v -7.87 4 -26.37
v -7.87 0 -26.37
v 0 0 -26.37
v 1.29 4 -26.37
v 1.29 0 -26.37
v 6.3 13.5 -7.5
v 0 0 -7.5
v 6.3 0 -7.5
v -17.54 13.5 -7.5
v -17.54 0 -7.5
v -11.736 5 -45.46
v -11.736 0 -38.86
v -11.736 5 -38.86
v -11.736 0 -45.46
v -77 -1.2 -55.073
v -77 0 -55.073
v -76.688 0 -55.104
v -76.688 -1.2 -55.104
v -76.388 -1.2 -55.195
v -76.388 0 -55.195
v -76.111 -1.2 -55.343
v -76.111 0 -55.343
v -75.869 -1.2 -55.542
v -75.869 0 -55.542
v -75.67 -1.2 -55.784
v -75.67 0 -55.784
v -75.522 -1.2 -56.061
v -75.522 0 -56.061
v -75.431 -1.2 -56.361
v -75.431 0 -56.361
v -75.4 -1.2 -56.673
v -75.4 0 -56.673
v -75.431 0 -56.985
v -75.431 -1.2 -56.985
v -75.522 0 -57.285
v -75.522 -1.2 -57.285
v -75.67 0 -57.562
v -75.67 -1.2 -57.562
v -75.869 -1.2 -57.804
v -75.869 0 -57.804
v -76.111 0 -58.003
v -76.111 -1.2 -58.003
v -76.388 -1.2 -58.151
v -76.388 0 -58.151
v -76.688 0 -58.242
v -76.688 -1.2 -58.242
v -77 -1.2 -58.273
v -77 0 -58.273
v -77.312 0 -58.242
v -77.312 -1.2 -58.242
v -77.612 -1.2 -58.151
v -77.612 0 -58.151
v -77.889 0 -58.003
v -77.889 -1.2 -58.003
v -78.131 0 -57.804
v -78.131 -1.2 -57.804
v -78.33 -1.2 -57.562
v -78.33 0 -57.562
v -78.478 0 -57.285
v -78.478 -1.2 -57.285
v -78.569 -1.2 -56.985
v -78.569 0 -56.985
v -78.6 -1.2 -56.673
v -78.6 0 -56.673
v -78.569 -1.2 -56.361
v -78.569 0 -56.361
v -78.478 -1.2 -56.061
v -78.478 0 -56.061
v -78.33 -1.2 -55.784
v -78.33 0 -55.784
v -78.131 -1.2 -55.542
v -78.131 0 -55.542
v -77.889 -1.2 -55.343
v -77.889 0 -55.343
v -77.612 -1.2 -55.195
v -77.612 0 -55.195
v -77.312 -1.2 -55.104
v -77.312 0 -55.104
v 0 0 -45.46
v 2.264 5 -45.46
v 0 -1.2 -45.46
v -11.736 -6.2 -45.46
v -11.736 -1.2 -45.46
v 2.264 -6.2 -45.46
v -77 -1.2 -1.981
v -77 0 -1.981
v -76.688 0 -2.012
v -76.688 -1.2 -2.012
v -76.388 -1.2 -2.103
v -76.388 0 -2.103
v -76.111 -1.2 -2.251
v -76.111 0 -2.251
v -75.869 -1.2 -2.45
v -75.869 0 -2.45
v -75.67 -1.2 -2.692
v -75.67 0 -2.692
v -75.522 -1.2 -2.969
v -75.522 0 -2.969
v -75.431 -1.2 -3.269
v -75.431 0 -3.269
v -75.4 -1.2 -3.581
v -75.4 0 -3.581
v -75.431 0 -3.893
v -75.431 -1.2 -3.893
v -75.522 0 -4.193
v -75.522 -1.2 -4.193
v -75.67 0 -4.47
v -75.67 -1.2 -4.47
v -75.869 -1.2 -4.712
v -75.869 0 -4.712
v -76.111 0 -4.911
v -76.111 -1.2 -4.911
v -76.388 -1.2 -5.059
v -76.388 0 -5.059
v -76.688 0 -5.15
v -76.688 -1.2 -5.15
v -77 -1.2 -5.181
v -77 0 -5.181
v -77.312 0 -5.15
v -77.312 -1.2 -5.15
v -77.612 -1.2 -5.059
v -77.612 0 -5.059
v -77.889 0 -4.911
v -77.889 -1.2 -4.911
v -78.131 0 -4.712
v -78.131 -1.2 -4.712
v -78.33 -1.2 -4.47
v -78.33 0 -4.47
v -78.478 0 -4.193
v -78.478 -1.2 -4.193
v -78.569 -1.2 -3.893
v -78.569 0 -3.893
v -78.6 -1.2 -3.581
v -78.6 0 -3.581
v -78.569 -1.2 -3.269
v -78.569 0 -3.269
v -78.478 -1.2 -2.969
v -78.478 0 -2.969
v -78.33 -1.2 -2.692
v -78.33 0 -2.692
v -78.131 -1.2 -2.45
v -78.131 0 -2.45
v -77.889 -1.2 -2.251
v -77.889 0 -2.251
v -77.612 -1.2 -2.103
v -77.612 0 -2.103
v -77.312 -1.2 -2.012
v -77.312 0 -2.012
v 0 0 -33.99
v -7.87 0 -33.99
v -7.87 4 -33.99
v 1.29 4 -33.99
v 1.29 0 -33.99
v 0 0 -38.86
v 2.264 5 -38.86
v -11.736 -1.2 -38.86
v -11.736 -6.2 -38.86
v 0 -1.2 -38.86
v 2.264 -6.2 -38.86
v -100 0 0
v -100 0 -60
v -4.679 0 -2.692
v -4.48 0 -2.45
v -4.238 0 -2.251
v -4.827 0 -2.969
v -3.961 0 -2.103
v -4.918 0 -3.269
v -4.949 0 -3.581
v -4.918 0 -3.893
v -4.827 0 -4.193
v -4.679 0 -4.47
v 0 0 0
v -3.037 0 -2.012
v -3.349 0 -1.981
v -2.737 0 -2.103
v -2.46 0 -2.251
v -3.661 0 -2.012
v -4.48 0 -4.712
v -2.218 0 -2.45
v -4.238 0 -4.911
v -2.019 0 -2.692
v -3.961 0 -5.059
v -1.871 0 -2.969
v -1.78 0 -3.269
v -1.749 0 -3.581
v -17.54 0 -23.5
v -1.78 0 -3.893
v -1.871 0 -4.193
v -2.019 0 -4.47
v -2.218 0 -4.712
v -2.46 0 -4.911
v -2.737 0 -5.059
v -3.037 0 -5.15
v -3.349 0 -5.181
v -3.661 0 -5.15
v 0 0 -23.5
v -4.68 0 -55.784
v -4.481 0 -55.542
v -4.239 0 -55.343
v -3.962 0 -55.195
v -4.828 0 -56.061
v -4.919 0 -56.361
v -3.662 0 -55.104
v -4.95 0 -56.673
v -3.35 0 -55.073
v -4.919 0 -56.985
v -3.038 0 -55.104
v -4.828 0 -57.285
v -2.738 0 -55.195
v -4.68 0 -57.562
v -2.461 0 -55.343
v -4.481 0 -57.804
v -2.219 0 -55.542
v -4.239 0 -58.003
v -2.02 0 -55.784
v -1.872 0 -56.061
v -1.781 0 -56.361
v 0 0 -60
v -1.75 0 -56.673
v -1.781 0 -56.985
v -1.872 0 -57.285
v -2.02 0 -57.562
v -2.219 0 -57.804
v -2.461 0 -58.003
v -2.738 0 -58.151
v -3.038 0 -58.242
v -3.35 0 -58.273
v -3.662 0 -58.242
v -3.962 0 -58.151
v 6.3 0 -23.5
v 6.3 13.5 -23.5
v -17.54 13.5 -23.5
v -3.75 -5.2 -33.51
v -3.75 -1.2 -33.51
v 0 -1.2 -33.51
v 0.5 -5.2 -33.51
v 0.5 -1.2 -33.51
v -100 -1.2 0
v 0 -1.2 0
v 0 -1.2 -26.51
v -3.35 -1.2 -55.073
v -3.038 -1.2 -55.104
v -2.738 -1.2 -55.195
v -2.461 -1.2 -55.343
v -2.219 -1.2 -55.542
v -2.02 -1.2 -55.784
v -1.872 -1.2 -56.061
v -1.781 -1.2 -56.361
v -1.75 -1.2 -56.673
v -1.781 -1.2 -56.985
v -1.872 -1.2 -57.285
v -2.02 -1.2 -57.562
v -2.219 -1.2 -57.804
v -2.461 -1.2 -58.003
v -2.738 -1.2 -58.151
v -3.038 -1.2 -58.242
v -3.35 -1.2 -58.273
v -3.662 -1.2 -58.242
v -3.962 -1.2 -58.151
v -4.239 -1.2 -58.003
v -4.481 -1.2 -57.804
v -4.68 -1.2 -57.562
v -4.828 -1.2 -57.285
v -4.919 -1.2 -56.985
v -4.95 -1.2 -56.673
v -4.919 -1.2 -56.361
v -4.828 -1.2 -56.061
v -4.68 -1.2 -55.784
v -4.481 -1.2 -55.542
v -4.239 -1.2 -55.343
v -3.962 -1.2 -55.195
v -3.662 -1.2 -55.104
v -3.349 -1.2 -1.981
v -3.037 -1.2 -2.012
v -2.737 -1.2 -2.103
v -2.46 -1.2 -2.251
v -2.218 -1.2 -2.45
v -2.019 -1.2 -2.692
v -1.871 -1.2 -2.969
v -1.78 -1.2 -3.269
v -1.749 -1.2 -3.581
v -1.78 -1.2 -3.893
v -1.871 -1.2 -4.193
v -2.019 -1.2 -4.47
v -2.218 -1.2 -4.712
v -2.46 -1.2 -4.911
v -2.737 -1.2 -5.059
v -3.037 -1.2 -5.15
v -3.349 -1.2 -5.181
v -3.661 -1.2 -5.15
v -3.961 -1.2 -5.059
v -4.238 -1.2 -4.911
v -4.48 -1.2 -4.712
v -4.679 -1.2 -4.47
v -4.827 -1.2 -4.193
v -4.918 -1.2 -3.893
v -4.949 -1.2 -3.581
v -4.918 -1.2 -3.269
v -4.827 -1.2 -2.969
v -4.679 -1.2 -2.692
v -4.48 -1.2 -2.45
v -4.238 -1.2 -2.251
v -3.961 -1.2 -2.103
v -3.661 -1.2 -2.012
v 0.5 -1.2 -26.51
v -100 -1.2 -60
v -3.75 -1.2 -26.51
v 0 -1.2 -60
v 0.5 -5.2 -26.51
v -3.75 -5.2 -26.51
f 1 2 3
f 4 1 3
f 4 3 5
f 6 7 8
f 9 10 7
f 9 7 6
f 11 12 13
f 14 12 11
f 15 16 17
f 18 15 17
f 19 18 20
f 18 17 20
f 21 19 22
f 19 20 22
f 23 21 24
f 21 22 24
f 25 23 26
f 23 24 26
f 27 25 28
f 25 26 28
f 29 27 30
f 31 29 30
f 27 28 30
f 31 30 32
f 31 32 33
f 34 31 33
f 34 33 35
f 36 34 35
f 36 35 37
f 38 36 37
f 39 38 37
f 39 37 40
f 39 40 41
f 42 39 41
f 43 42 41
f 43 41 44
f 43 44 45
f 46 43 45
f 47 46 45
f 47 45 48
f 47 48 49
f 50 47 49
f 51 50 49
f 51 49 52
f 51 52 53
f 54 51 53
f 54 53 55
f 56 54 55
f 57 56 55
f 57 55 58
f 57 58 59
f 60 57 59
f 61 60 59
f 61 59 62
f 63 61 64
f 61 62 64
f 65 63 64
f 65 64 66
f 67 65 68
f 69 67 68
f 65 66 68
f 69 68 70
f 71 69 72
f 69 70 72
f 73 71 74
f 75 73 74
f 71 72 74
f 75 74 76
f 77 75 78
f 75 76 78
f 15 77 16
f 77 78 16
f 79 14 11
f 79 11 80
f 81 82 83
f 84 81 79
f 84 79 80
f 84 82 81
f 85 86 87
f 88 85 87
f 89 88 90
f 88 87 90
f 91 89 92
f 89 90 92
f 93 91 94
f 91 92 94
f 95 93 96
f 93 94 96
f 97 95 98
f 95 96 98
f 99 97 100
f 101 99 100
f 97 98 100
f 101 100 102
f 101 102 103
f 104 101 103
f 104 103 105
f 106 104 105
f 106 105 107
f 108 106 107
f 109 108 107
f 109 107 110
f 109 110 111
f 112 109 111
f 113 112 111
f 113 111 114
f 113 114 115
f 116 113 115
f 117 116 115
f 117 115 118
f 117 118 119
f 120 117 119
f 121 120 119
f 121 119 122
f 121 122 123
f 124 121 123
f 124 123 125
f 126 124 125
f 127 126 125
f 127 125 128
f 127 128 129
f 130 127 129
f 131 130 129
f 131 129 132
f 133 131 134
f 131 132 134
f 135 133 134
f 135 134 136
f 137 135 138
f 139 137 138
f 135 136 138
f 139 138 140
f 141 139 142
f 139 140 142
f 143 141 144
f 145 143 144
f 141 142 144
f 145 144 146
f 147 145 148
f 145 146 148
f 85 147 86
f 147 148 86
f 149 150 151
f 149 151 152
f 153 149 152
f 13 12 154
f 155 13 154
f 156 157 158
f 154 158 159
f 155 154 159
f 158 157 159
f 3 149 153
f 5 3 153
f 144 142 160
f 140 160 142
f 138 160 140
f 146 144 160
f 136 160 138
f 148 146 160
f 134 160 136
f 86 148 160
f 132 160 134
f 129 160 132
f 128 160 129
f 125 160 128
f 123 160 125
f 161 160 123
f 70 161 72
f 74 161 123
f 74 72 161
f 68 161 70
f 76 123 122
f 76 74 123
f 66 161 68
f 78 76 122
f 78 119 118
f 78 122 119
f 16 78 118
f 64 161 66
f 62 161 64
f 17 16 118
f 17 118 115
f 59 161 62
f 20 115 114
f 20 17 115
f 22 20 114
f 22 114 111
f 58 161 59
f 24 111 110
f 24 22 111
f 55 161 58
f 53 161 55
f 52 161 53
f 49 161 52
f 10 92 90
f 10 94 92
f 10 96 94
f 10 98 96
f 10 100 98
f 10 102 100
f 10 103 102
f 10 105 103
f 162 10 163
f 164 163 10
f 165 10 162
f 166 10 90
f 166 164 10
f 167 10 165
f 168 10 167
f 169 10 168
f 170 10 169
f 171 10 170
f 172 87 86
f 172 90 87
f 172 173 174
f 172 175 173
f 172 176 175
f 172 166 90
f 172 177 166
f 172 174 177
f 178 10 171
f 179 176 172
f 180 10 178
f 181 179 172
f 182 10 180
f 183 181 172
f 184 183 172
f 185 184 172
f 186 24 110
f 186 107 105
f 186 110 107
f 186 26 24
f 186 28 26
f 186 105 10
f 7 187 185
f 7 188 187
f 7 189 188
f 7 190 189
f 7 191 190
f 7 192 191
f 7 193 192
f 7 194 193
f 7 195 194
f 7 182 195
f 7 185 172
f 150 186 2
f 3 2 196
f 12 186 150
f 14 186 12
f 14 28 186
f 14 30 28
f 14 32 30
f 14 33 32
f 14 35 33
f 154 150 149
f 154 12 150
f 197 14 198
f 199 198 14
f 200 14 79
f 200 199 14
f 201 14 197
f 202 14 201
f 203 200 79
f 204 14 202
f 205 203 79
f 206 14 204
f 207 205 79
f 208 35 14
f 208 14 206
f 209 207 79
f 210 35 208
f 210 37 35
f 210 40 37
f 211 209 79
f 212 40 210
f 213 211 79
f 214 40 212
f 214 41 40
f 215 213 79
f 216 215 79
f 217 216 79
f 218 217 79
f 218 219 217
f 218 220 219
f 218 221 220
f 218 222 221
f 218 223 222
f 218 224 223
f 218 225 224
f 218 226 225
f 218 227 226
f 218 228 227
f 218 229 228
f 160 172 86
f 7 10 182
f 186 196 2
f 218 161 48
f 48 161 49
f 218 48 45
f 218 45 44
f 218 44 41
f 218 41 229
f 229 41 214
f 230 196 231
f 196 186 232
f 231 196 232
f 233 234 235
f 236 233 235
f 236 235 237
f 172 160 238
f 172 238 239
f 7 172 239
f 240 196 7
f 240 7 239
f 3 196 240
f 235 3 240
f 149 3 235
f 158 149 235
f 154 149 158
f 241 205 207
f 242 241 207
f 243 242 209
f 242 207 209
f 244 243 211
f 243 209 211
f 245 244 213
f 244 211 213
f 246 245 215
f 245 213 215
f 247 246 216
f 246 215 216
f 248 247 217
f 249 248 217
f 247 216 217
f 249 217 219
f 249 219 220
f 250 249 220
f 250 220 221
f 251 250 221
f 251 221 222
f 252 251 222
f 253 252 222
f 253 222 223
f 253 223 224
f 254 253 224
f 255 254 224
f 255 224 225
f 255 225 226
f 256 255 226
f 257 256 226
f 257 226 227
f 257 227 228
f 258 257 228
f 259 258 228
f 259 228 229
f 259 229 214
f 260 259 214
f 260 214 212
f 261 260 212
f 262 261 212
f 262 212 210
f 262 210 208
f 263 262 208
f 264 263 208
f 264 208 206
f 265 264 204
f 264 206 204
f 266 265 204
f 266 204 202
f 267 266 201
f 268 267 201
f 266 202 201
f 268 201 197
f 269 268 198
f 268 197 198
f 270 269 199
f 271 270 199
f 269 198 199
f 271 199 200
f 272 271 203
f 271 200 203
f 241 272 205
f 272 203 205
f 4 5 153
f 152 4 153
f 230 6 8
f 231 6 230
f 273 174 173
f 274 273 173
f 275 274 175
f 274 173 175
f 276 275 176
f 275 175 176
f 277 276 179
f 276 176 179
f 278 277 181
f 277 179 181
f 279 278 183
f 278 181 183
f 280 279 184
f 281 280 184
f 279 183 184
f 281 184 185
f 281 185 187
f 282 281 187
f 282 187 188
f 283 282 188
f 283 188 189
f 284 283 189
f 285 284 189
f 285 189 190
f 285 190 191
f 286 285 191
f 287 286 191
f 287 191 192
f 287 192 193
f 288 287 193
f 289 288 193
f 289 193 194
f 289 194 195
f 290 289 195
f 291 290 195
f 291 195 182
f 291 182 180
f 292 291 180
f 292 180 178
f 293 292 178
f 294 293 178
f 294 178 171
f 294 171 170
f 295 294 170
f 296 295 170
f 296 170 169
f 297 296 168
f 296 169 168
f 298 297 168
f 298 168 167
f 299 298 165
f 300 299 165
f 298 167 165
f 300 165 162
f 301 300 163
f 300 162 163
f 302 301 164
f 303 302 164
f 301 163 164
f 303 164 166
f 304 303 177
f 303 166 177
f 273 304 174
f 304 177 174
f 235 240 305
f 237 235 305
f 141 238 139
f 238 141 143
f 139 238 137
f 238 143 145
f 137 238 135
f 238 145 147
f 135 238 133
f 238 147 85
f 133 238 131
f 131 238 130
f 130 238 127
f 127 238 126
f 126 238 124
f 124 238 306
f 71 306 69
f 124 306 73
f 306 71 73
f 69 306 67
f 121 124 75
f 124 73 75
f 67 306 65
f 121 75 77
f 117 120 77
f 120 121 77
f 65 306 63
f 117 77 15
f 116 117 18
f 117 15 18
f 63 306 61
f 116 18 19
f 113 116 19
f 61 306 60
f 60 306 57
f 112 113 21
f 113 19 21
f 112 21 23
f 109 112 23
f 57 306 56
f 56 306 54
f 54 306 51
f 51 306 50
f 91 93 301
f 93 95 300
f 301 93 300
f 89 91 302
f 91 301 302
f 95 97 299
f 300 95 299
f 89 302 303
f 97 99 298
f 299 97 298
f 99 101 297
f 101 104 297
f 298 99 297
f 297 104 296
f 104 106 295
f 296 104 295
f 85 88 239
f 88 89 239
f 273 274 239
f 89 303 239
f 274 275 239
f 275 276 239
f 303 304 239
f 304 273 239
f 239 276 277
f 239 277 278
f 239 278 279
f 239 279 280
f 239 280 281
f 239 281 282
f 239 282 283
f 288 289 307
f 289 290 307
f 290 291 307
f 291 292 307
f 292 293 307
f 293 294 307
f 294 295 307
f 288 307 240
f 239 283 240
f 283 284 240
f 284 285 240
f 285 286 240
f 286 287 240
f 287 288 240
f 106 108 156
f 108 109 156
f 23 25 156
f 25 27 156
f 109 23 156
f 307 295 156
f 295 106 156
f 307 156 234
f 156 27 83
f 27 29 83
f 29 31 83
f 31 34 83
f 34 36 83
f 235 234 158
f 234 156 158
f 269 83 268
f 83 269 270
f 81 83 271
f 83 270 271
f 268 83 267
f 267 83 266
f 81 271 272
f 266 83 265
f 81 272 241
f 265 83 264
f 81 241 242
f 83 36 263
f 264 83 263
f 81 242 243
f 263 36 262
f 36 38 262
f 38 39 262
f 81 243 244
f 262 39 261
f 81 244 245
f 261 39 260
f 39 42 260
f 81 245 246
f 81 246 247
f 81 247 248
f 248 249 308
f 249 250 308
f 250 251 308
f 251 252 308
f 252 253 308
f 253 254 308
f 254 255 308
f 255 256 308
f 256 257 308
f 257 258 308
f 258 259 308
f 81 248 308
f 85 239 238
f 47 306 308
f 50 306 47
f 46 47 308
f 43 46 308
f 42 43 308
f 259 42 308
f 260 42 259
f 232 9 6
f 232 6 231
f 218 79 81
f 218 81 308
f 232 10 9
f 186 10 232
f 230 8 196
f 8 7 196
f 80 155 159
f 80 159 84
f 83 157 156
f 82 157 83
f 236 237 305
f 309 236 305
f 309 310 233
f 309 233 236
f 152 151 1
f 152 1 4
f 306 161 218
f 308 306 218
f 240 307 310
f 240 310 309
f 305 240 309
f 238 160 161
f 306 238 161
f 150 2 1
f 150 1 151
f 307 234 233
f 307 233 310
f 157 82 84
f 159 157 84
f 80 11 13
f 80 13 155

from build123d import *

# Parameters (mm, degrees)
ESQUISSE1_W             = 100
ESQUISSE1_H             = 60
BOSS_EXTRU_1_DEPTH      = 1.2
ESQUISSE2_W             = 21.84
ESQUISSE2_H             = 16
BOSS_EXTRU_2_DEPTH      = 13.5
ESQUISSE3_W             = 9.16
ESQUISSE3_H             = 7.62
BOSS_EXTRU_3_DEPTH      = 4
BOSS_EXTRU_4_DEPTH      = 5
BOSS_EXTRU_4_DEPTH_BACK = 6.2
ESQUISSE4_W             = 14
ESQUISSE4_H             = 6.6
ESQUISSE5_W             = 4.25
ESQUISSE5_H             = 7
BOSS_EXTRU_5_DEPTH      = 4
ENL_V_MAT_EXTRU_1_REACH = 119.398
ESQUISSE6_R             = 1.6
ESQUISSE7_W             = 16
ESQUISSE7_H             = 13.5
BOSS_EXTRU_6_DEPTH      = 2


with BuildPart() as part:
    # Esquisse1 → Boss.-Extru.1 (new body)
    with BuildSketch(Plane(origin=(0, 0, 0), x_dir=(1, 0, 0), z_dir=(0, 1, 0))):
        with Locations((-50, 30)):
            Rectangle(ESQUISSE1_W, ESQUISSE1_H)
    extrude(amount=-BOSS_EXTRU_1_DEPTH)

    # Esquisse2 → Boss.-Extru.2 (add)
    with BuildSketch(Plane(origin=(0, 0, 0), x_dir=(1, 0, 0), z_dir=(0, 1, 0))):
        with Locations((-6.62, 15.5)):
            Rectangle(ESQUISSE2_W, ESQUISSE2_H)
    extrude(amount=BOSS_EXTRU_2_DEPTH)

    # Esquisse3 → Boss.-Extru.3 (add)
    with BuildSketch(Plane(origin=(0, 0, 0), x_dir=(1, 0, 0), z_dir=(0, 1, 0))):
        with Locations((-3.29, 30.18)):
            Rectangle(ESQUISSE3_W, ESQUISSE3_H)
    extrude(amount=BOSS_EXTRU_3_DEPTH)

    # Esquisse4 → Boss.-Extru.4 (add, two sides: drawn at the far end of the back side and taken through both)
    with BuildSketch(Plane(origin=(0, 0, 0), x_dir=(1, 0, 0), z_dir=(0, 1, 0)).offset(-BOSS_EXTRU_4_DEPTH_BACK)):
        with Locations((-4.736, 42.16)):
            Rectangle(ESQUISSE4_W, ESQUISSE4_H)
    extrude(amount=BOSS_EXTRU_4_DEPTH + BOSS_EXTRU_4_DEPTH_BACK)

    # Esquisse5 → Boss.-Extru.5 (add)
    with BuildSketch(Plane.XZ.offset(1.2)):
        with Locations((-1.625, -30.01)):
            Rectangle(ESQUISSE5_W, ESQUISSE5_H)
    extrude(amount=BOSS_EXTRU_5_DEPTH)

    # Esquisse6 → Enlèv. mat.-Extru.1 (cut, up to next)
    with BuildSketch(Plane(origin=(0, 0, 0), x_dir=(1, 0, 0), z_dir=(0, 1, 0)), mode=Mode.PRIVATE) as enl_v_mat_extru_1_sk1:
        with Locations(Location((-77, 56.673, 0), (0, 0, 270))):
            Circle(ESQUISSE6_R)
    enl_v_mat_extru_1_tool1 = extrude(enl_v_mat_extru_1_sk1.sketch, amount=-ENL_V_MAT_EXTRU_1_REACH, mode=Mode.PRIVATE) & part.part
    # Esquisse6 → Enlèv. mat.-Extru.1 (cut, up to next)
    with BuildSketch(Plane(origin=(0, 0, 0), x_dir=(1, 0, 0), z_dir=(0, 1, 0)), mode=Mode.PRIVATE) as enl_v_mat_extru_1_sk2:
        with Locations(Location((-77, 3.581, 0), (0, 0, 270))):
            Circle(ESQUISSE6_R)
    enl_v_mat_extru_1_tool2 = extrude(enl_v_mat_extru_1_sk2.sketch, amount=-ENL_V_MAT_EXTRU_1_REACH, mode=Mode.PRIVATE) & part.part
    # Esquisse6 → Enlèv. mat.-Extru.1 (cut, up to next)
    with BuildSketch(Plane(origin=(0, 0, 0), x_dir=(1, 0, 0), z_dir=(0, 1, 0)), mode=Mode.PRIVATE) as enl_v_mat_extru_1_sk3:
        with Locations(Location((-3.35, 56.673, 0), (0, 0, 270))):
            Circle(ESQUISSE6_R)
    enl_v_mat_extru_1_tool3 = extrude(enl_v_mat_extru_1_sk3.sketch, amount=-ENL_V_MAT_EXTRU_1_REACH, mode=Mode.PRIVATE) & part.part
    # Esquisse6 → Enlèv. mat.-Extru.1 (cut, up to next)
    with BuildSketch(Plane(origin=(0, 0, 0), x_dir=(1, 0, 0), z_dir=(0, 1, 0)), mode=Mode.PRIVATE) as enl_v_mat_extru_1_sk4:
        with Locations(Location((-3.349, 3.581, 0), (0, 0, 270))):
            Circle(ESQUISSE6_R)
    enl_v_mat_extru_1_tool4 = extrude(enl_v_mat_extru_1_sk4.sketch, amount=-ENL_V_MAT_EXTRU_1_REACH, mode=Mode.PRIVATE) & part.part
    add(enl_v_mat_extru_1_tool1.solids().sort_by_distance((-77, 0, -56.673))[0], mode=Mode.SUBTRACT)
    add(enl_v_mat_extru_1_tool2.solids().sort_by_distance((-77, 0, -3.581))[0], mode=Mode.SUBTRACT)
    add(enl_v_mat_extru_1_tool3.solids().sort_by_distance((-3.35, 0, -56.673))[0], mode=Mode.SUBTRACT)
    add(enl_v_mat_extru_1_tool4.solids().sort_by_distance((-3.349, 0, -3.581))[0], mode=Mode.SUBTRACT)

    # Esquisse7 → Boss.-Extru.6 (add)
    with BuildSketch(Plane(origin=(4.3, 0, 0), x_dir=(0, 0, -1), z_dir=(1, 0, 0))):
        with Locations((15.5, 6.75)):
            Rectangle(ESQUISSE7_W, ESQUISSE7_H)
    extrude(amount=BOSS_EXTRU_6_DEPTH)


solid = part.part
